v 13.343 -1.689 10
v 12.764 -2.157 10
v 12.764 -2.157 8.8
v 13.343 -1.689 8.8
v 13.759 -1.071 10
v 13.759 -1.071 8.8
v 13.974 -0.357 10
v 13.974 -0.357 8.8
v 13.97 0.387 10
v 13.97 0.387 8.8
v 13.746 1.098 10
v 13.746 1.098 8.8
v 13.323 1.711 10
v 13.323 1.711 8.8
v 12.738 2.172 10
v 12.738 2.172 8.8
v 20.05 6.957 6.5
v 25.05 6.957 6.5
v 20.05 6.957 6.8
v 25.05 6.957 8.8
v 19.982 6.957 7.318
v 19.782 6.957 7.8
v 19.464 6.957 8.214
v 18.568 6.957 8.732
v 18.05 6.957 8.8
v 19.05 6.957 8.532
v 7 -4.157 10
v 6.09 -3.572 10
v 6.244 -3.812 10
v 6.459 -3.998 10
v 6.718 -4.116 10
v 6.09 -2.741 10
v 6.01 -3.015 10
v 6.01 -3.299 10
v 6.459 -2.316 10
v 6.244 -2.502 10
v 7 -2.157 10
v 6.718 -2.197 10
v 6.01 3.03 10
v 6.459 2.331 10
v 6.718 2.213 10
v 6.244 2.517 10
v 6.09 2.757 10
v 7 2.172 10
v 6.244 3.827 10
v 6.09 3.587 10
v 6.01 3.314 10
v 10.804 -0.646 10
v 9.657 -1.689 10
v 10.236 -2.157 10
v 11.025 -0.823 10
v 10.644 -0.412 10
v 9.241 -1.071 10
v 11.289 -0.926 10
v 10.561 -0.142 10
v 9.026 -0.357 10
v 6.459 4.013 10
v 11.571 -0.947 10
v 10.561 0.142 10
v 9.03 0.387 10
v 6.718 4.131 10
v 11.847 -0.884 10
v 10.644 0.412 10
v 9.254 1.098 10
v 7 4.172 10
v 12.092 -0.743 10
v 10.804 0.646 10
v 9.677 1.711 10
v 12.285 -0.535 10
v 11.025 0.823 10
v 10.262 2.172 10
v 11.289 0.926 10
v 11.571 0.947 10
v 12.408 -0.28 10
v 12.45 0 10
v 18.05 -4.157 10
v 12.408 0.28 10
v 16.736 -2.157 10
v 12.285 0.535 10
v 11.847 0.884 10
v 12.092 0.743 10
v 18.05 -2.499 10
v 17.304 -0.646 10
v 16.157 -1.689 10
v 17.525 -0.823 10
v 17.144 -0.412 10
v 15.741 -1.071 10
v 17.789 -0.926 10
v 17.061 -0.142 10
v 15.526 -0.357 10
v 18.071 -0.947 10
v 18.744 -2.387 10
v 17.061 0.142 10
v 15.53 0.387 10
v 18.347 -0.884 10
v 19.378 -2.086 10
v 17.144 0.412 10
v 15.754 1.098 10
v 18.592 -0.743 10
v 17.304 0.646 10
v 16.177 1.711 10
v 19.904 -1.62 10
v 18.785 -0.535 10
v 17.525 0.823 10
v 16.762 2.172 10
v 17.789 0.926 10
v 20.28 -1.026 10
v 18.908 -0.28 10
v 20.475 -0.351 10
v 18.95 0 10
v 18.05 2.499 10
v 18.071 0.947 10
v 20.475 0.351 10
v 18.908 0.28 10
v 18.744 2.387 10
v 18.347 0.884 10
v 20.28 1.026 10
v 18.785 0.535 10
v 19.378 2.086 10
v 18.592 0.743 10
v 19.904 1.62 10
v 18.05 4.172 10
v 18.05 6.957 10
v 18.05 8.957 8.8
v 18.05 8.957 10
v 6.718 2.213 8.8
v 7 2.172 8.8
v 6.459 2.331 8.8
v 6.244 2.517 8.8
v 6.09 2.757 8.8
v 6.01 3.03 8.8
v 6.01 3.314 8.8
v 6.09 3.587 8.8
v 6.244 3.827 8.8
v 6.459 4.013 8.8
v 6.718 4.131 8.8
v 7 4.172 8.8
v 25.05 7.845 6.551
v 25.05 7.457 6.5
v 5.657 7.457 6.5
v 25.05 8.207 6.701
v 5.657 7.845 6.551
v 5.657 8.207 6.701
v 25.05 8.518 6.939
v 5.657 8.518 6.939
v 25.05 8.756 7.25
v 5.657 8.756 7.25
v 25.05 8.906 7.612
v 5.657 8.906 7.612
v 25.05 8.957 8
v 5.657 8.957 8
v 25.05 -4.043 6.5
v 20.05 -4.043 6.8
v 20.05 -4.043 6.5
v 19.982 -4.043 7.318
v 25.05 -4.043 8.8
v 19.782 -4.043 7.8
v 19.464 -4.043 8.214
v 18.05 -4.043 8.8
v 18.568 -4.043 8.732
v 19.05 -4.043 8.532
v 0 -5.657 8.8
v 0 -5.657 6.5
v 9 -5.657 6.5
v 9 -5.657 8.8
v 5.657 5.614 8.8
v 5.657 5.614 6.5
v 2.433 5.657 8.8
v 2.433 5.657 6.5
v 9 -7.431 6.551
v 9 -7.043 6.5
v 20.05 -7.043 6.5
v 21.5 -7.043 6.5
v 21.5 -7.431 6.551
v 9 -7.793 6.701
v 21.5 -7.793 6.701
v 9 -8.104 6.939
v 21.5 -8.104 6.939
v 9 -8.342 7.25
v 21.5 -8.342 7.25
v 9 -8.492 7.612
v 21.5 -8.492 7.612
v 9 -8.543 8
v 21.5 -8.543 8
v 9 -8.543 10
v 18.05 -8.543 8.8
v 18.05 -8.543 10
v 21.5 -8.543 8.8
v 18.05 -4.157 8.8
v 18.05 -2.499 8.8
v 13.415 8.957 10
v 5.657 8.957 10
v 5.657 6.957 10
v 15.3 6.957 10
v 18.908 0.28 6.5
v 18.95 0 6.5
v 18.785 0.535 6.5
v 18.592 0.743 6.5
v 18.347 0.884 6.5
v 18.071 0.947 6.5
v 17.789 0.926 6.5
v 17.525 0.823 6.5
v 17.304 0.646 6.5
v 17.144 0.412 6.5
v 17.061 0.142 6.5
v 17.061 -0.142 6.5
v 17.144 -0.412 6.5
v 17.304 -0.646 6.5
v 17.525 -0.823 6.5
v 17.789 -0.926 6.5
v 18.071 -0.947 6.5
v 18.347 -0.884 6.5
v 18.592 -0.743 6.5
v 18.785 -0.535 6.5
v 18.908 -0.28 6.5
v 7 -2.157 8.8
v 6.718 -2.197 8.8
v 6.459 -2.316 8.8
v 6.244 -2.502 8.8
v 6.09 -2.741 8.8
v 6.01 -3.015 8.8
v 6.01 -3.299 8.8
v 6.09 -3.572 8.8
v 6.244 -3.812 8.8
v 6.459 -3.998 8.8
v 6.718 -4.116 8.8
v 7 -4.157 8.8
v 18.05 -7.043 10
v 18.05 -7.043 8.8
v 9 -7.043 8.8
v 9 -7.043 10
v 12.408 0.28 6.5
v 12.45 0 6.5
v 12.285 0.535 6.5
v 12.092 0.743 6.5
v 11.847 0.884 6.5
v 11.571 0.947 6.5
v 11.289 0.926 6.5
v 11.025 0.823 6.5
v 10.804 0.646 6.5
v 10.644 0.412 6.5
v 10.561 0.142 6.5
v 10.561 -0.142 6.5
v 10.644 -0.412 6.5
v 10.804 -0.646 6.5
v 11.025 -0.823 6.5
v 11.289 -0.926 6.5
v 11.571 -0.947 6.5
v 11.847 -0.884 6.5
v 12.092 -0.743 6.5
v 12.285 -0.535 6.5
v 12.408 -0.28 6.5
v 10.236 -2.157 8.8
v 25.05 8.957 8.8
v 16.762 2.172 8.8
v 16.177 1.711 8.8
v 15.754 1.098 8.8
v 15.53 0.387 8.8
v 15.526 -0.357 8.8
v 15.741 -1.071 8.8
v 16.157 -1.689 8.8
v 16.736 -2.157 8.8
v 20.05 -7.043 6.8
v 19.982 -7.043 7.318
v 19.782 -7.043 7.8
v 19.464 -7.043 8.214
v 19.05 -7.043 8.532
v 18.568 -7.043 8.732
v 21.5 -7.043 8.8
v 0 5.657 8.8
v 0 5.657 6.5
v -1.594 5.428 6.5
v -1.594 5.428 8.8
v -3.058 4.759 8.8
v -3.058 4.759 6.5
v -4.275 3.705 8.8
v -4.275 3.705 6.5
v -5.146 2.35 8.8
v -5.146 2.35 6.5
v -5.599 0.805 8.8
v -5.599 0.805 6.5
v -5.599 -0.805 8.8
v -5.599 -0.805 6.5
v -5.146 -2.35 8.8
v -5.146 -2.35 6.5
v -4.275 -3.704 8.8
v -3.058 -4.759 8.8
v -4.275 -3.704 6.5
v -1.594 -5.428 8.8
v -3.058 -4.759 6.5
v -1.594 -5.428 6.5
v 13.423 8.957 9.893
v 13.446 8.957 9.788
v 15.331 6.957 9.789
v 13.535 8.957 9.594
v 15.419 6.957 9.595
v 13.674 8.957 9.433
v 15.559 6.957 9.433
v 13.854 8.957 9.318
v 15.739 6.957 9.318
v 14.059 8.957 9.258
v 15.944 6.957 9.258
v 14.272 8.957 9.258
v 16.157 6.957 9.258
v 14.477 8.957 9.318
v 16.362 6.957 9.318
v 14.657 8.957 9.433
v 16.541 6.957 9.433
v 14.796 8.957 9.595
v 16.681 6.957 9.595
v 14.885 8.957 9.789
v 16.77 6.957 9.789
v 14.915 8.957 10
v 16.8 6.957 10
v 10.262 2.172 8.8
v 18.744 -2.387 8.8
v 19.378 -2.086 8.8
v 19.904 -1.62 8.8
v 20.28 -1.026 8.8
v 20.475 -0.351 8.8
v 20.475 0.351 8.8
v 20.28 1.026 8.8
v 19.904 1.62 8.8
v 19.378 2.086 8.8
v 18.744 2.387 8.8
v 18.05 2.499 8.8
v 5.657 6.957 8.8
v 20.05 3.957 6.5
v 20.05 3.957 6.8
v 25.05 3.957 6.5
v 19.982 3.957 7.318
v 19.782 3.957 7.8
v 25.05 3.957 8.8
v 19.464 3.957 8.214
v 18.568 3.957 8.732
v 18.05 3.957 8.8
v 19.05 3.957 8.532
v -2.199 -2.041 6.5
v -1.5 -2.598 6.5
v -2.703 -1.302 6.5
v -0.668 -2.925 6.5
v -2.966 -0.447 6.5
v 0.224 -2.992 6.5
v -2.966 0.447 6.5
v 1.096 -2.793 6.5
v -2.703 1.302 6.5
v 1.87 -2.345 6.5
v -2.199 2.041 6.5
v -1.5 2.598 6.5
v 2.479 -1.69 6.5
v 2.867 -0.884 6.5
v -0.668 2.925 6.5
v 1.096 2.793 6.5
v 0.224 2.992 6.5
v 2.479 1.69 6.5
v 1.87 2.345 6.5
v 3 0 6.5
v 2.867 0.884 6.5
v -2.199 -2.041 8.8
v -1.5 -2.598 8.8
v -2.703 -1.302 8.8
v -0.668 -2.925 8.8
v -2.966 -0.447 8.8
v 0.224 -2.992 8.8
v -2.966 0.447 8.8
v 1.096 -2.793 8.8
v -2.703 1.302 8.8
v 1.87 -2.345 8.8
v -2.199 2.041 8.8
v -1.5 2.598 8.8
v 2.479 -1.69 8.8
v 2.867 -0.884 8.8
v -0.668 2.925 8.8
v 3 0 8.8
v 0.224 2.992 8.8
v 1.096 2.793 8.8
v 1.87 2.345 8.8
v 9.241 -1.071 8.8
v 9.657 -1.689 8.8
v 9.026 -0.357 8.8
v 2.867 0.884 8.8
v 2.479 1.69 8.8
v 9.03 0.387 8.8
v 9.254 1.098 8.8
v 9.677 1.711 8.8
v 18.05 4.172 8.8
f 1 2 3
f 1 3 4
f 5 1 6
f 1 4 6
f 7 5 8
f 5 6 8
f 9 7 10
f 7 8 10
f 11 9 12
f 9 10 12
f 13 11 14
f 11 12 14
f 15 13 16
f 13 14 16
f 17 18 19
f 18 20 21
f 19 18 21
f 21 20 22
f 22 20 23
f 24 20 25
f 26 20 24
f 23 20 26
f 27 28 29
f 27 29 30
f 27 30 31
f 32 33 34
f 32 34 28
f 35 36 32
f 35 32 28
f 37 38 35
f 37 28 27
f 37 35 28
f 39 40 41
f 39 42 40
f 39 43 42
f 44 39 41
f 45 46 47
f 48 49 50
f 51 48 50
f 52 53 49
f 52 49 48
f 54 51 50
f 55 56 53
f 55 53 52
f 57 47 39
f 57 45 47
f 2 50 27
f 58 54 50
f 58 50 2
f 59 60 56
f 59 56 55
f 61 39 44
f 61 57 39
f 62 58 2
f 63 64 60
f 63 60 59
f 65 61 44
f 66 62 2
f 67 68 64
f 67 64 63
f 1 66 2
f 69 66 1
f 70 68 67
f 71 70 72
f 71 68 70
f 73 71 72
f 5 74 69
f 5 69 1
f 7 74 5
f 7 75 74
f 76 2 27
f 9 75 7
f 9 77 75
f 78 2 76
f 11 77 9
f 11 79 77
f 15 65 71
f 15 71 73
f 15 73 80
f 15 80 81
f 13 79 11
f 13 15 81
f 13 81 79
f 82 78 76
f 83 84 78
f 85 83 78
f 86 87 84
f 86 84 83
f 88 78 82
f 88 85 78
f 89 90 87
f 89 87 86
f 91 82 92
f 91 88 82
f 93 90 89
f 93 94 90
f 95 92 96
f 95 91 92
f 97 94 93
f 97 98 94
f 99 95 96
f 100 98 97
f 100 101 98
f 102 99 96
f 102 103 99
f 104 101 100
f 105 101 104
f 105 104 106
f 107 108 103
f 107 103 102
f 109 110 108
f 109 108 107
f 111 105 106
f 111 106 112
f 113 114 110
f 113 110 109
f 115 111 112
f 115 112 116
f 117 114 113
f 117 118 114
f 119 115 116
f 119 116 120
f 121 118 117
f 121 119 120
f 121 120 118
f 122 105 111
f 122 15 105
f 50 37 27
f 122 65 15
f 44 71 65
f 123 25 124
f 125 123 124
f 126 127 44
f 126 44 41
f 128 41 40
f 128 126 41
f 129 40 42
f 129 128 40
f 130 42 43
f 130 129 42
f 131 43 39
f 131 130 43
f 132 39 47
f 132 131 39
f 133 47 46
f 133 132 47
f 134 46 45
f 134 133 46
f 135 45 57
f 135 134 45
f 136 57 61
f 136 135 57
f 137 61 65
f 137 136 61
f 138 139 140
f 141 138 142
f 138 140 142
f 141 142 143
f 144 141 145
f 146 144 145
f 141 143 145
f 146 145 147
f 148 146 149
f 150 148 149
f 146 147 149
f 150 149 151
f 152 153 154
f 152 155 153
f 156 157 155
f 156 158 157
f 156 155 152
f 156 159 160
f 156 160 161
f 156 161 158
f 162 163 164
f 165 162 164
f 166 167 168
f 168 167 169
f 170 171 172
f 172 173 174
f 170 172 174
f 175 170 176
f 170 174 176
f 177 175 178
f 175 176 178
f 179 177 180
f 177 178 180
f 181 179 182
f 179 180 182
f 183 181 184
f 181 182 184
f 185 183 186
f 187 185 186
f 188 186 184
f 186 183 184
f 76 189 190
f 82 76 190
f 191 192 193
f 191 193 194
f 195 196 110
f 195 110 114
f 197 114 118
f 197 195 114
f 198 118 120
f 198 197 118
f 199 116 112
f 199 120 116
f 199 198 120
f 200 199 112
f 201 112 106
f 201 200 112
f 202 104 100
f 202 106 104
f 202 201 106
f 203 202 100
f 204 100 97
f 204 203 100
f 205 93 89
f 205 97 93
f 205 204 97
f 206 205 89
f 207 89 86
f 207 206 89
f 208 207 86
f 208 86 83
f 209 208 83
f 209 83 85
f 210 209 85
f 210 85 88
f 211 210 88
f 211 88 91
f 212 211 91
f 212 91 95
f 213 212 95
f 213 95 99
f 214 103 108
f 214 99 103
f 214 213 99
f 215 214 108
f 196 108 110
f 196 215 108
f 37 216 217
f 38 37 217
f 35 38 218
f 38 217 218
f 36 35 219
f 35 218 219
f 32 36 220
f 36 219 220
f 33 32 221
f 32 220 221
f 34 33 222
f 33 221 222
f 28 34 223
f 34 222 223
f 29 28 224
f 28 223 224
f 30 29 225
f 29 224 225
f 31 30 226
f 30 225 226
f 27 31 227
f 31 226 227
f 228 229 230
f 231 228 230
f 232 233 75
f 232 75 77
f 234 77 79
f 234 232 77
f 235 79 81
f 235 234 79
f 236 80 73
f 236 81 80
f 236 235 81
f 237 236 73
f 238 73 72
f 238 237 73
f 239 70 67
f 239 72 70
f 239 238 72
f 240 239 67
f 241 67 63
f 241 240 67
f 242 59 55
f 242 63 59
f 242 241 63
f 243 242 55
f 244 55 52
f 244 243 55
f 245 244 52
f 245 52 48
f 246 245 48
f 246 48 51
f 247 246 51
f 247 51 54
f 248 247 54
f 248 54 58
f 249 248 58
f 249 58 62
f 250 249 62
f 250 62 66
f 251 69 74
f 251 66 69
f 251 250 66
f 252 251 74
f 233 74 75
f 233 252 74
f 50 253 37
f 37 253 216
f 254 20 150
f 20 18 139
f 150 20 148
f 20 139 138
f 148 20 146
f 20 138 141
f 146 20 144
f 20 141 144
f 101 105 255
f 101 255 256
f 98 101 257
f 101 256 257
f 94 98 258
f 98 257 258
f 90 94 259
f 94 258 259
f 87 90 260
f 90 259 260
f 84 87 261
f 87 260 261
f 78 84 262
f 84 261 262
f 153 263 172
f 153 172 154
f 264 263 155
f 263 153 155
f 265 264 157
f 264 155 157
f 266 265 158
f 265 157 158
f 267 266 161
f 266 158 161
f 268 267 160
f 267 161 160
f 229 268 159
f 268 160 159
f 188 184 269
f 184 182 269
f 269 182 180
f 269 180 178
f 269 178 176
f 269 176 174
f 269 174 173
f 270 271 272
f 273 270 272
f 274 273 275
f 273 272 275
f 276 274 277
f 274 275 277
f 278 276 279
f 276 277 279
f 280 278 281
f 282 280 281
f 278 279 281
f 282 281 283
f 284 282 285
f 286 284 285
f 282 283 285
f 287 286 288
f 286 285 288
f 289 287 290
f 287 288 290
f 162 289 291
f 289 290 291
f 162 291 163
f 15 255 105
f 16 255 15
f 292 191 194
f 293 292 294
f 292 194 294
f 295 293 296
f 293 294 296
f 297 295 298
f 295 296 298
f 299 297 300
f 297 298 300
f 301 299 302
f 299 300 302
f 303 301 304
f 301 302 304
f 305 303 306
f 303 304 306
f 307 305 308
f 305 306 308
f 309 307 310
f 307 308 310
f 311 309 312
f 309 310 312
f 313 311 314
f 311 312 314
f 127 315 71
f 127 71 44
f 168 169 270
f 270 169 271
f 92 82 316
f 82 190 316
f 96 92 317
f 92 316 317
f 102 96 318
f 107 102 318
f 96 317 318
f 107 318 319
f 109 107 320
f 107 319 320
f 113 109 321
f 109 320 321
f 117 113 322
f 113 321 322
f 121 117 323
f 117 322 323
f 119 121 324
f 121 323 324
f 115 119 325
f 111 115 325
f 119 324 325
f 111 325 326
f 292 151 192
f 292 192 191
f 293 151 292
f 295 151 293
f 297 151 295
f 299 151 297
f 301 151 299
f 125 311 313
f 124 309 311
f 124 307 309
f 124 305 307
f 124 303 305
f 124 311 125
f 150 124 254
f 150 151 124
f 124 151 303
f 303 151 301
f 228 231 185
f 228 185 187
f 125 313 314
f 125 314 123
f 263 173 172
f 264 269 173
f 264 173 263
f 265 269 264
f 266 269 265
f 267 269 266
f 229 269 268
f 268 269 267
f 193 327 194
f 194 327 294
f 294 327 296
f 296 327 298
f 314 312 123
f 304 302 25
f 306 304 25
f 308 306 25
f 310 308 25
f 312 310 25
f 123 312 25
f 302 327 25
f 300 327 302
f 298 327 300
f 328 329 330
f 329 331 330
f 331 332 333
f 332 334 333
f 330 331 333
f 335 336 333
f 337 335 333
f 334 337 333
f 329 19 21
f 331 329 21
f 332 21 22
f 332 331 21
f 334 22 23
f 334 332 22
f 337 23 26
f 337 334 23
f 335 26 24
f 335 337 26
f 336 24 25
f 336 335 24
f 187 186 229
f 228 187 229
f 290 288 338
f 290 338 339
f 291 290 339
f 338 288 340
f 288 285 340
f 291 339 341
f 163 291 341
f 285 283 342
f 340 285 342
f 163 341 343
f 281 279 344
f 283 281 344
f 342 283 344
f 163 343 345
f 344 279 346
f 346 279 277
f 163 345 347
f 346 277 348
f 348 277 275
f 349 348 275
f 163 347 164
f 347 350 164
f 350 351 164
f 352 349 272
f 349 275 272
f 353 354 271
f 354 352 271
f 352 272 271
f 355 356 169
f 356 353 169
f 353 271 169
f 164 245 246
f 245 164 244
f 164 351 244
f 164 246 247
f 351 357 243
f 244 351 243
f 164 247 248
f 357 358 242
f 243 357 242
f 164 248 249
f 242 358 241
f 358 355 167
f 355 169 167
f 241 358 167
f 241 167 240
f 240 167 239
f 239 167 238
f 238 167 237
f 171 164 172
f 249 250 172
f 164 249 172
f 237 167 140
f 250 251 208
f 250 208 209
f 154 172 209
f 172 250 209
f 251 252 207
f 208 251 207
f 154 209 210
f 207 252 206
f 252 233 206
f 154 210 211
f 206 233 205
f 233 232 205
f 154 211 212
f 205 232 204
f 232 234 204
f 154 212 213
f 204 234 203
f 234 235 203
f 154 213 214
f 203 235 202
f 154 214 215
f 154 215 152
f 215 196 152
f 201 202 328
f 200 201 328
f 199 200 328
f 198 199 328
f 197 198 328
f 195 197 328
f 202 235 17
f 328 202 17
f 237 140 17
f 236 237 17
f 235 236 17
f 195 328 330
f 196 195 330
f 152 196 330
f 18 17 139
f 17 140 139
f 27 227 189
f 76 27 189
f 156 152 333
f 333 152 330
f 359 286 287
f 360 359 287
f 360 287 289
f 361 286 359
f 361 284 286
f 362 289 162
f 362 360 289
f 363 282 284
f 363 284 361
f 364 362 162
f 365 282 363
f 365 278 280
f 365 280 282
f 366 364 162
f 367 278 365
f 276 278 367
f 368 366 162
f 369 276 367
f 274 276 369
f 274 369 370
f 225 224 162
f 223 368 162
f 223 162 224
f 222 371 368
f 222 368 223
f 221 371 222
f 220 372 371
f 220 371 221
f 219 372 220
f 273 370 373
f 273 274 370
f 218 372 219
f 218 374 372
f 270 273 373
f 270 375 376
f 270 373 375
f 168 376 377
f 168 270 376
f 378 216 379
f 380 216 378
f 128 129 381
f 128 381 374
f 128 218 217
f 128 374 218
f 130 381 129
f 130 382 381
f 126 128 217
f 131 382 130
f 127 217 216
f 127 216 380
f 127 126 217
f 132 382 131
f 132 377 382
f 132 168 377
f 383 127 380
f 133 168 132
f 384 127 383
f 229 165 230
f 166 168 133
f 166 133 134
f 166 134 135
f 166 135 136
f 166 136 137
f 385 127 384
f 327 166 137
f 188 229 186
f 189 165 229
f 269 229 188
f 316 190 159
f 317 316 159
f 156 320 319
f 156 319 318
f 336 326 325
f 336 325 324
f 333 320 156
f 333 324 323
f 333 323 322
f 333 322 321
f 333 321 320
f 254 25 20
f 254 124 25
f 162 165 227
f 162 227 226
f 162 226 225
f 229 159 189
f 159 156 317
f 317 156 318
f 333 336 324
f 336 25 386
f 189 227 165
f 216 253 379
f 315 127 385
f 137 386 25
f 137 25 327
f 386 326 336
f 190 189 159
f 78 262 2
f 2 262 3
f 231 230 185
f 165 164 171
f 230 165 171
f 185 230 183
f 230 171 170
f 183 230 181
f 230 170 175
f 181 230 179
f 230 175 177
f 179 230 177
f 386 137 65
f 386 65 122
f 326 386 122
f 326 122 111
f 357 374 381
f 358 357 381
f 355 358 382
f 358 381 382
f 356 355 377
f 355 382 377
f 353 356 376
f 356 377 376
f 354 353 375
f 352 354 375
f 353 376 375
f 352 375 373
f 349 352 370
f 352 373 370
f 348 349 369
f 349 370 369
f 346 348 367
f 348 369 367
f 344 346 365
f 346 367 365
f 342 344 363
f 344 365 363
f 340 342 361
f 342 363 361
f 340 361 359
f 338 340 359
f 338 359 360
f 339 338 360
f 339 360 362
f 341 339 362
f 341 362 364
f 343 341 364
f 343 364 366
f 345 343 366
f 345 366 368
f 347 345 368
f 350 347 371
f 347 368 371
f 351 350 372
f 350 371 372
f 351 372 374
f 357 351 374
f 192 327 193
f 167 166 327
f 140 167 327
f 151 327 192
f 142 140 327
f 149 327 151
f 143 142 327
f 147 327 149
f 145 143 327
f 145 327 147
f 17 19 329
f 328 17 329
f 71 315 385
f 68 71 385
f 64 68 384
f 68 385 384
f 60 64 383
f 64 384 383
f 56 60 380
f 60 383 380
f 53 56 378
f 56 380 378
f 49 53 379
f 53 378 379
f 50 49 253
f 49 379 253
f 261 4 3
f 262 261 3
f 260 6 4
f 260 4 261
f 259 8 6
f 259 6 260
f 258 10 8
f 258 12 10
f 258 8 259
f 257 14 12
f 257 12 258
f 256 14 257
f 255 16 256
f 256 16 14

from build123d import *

# Parameters (mm, degrees)
BOSS_EXTRUDE1_DEPTH      = 2
BOSS_EXTRUDE6_DEPTH      = 4.5
CUT_EXTRUDE6_DEPTH       = 4.5
BOSS_EXTRUDE14_DEPTH     = 2.3
SKETCH32_R               = 3
CUT_EXTRUDE7_DEPTH       = 2.3
SKETCH33_W               = 12.393398282201806
SKETCH33_H               = 2.000000000000001
BOSS_EXTRUDE15_DEPTH     = 1.2
CUT_EXTRUDE8_DEPTH       = 2.4
SKETCH43_R               = 2.5000000000000004
SKETCH43_R_2             = 2.4999999999999982
BOSS_EXTRUDE17_DEPTH     = 1.2
CUT_EXTRUDE11_DEPTH      = 29.420773915365164
CUT_EXTRUDE11_DEPTH_BACK = 29.420773915365164
SKETCH44_R               = 0.9499999999999992
SKETCH44_R_2             = 0.9500000000000008
SKETCH49_R               = 0.7500000000000021
CUT_EXTRUDE13_DEPTH      = 3
FILLET1_R                = 1.5
FILLET3_START            = -1
FILLET3_DEPTH            = 8
FILLET3_START_2          = 5
FILLET3_2_DEPTH          = 21
FILLET3_3_DEPTH          = 8
SKETCH45_R               = 1.9999999999999996
SKETCH45_R_2             = 2.000000000000003
CUT_EXTRUDE15_DEPTH      = 4
FILLET4_R                = 2
BOSS_EXTRUDE18_DEPTH     = 12
SKETCH52_R               = 1.500000000000004
SKETCH52_R_2             = 1.5000000000000007
CUT_EXTRUDE16_DEPTH      = 12


with BuildPart() as part:
    # Sketch3 → Boss-Extrude1 (new body)
    with BuildSketch(Plane.XY):
        with BuildLine():
            Line((8.000000000000002, 0), (8.999999999999995, -2.5431457505076205))
            Line((8.999999999999995, -2.5431457505076205), (8.999999999999995, -7.043145750507605))
            Line((8.999999999999995, -7.043145750507605), (21.50000000000004, -7.043145750507604))
            Line((21.50000000000004, -7.043145750507604), (25.05025253169418, -7.043145750507604))
            Line((25.05025253169418, -7.043145750507604), (25.050252531694177, 7.456854249492383))
            Line((25.050252531694177, 7.456854249492383), (5.656854249492373, 7.456854249492379))
            Line((5.656854249492373, 7.456854249492379), (5.656854249492376, 5.656854249492382))
            ThreePointArc((5.656854249492376, 5.656854249492382), (7.391036260090296, 3.061467458920721), (8.000000000000002, 0))
        make_face()
    extrude(amount=BOSS_EXTRUDE1_DEPTH)

    # Sketch22 → Boss-Extrude6 (add)
    with BuildSketch(Plane.XY.offset(2)):
        with BuildLine():
            Line((5.656854249492378, 7.456854249492383), (21.500000000000025, 7.456854249492383))
            Line((21.500000000000025, 7.456854249492383), (25.050252531694177, 7.456854249492383))
            Line((25.050252531694177, 7.456854249492383), (25.05025253169418, -7.043145750507604))
            Line((25.05025253169418, -7.043145750507604), (8.999999999999995, -7.043145750507605))
            Line((8.999999999999995, -7.043145750507605), (8.999999999999995, -2.5431457505076205))
            Line((8.999999999999995, -2.5431457505076205), (7.999999999999998, 0))
            ThreePointArc((7.999999999999998, 0), (7.391036260090291, 3.061467458920719), (5.656854249492376, 5.656854249492382))
            Line((5.656854249492376, 5.656854249492382), (5.656854249492378, 7.456854249492383))
        make_face()
    extrude(amount=BOSS_EXTRUDE6_DEPTH)

    # Sketch26 → Cut-Extrude6 (cut)
    with BuildSketch(Plane.XY.offset(2)):
        Polygon((18.098080447707712, 5.299999999999999), (2.5300524575164793, 5.299999999999999), (2.5300524575164793, 4), (18.098080447707712, 4), (25.05025253169419, 4.000000000000001), (25.05025253169419, 5.299999999999999), align=None)
    extrude(amount=CUT_EXTRUDE6_DEPTH, mode=Mode.SUBTRACT)


with BuildPart() as body_2:
    # Sketch31 → Boss-Extrude14 (new body)
    with BuildSketch(Plane.XY.offset(6.5)):
        with BuildLine():
            Line((2.4326880657739025, 5.656854247099344), (0.00016454221484158, 5.656854247099344))
            ThreePointArc((0.00016454221484158, 5.656854247099344), (-5.656854248894122, 8.227110743131e-05), (0, -5.656854249492382))
            Line((0, -5.656854249492382), (9.000000000000004, -5.656854249492382))
            Line((9.000000000000004, -5.656854249492382), (8.999999999999995, -7.043145750507605))
            Line((8.999999999999995, -7.043145750507605), (8.999999999999995, -8.543145750507605))
            Line((8.999999999999995, -8.543145750507605), (21.50000000000004, -8.543145750507605))
            Line((21.50000000000004, -8.543145750507605), (21.50000000000004, -7.043145750507605))
            Line((21.50000000000004, -7.043145750507605), (25.05025253169418, -7.043145750507604))
            Line((25.05025253169418, -7.043145750507604), (25.05025253169418, 8.956854249492379))
            Line((25.05025253169418, 8.956854249492379), (5.656854249492376, 8.956854249492379))
            Line((5.656854249492376, 8.956854249492379), (5.656854249492378, 7.456854249492383))
            Line((5.656854249492378, 7.456854249492383), (5.656854249492376, 5.613708498984764))
            Line((5.656854249492376, 5.613708498984764), (2.4326880657739025, 5.656854247099344))
        make_face()
    extrude(amount=BOSS_EXTRUDE14_DEPTH)

    # Sketch32 → Cut-Extrude7 (cut)
    with BuildSketch(Plane.XY.offset(8.799999999999999)):
        Circle(SKETCH32_R)
    extrude(amount=-CUT_EXTRUDE7_DEPTH, mode=Mode.SUBTRACT)

    # Sketch33 → Boss-Extrude15 (add)
    with BuildSketch(Plane.XY.offset(8.799999999999999)):
        with Locations((11.853553390593277, 7.956854249492379)):
            Rectangle(SKETCH33_W, SKETCH33_H)
        Polygon((9.000000000000004, -7.043145750507606), (9.000000000000004, -8.543145750507605), (18.05025253169418, -8.543145750507605), (18.05025253169418, -7.0431457505076045), align=None)
        with BuildLine():
            Line((7.000000000000003, -4.156854249492383), (18.05025253169419, -4.156854249492383))
            Line((18.05025253169419, -4.156854249492383), (18.05025253169419, -2.1568542494923824))
            Line((18.05025253169419, -2.1568542494923824), (7.000000000000003, -2.1568542494923832))
            ThreePointArc((7.000000000000003, -2.1568542494923832), (6.000000000000003, -3.1568542494923832), (7.000000000000003, -4.156854249492383))
        make_face()
        with BuildLine():
            Line((18.05025253169419, 2.172006245196199), (7.000000000000003, 2.172006245196201))
            ThreePointArc((7.000000000000003, 2.172006245196201), (6.0000000000000036, 3.1720062451962), (7.000000000000003, 4.172006245196199))
            Line((7.000000000000003, 4.172006245196199), (18.05025253169419, 4.172006245196199))
            Line((18.05025253169419, 4.172006245196199), (18.05025253169419, 2.172006245196199))
        make_face()
    extrude(amount=BOSS_EXTRUDE15_DEPTH)


with BuildPart() as cut_extrude8_tool:
    # Sketch35 → Cut-Extrude8 (new body)
    with BuildSketch(Plane.XY.offset(8.799999999999999)):
        Polygon((25.05025253169418, 3.956854249492379), (25.05025253169418, 6.9568542494923795), (20.05025253169418, 6.956854249492378), (20.05025253169418, 3.9568542494923773), align=None)
        Polygon((25.05025253169418, -7.043145750507604), (20.05025253169419, -7.0431457505076045), (20.05025253169419, -4.043145750507604), (25.05025253169418, -4.043145750507604), align=None)
    extrude(amount=-CUT_EXTRUDE8_DEPTH)


with BuildPart() as part_1:
    add(part.part)

    # Cut-Extrude8: cut by cut_extrude8_tool
    add(cut_extrude8_tool.part, mode=Mode.SUBTRACT)


with BuildPart() as body_2_1:
    add(body_2.part)

    # Cut-Extrude8: cut by cut_extrude8_tool
    add(cut_extrude8_tool.part, mode=Mode.SUBTRACT)

    # Sketch43 → Boss-Extrude17 (add)
    with BuildSketch(Plane.XY.offset(8.799999999999999)):
        with Locations((11.500000000000004, 0)):
            Circle(SKETCH43_R)
        with Locations((18.000000000000004, 0)):
            Circle(SKETCH43_R_2)
    extrude(amount=BOSS_EXTRUDE17_DEPTH)


with BuildPart() as cut_extrude11_tool:
    # Sketch44 → Cut-Extrude11 (new, two sides: drawn at the far end of the back side and taken through both)
    with BuildSketch(Plane.XY.offset(9.999999999999998).offset(-CUT_EXTRUDE11_DEPTH_BACK)):
        with Locations((11.500000000000004, 0)):
            Circle(SKETCH44_R)
        with Locations((18.000000000000004, 0)):
            Circle(SKETCH44_R_2)
    extrude(amount=CUT_EXTRUDE11_DEPTH + CUT_EXTRUDE11_DEPTH_BACK)


with BuildPart() as part_2:
    add(part_1.part)

    # Cut-Extrude11: cut by cut_extrude11_tool
    add(cut_extrude11_tool.part, mode=Mode.SUBTRACT)

    # Fillet3: read off the stored shape, not the designer's step
    # Fillet3 outline → Fillet3 (cut)
    with BuildSketch(Plane.XY.offset(FILLET3_START)):
        with BuildLine():
            Line((9, -7.043145751), (10, -7.043145751))
            add(Edge.make_bspline(
                [(10, -7.043145751), (8.99999999999999, -7.043145750507609), (9, -6.043145751)],
                knots=[0, 0, 0, 1, 1, 1], degree=2, weights=[1, 0.7071067811865481, 1]))
            Line((9, -6.043145751), (9, -7.043145751))
        make_face()
        with BuildLine():
            Line((5.656854249, 7.456854249), (5.656854249, 6.456854249))
            add(Edge.make_bspline(
                [(5.656854249, 6.456854249), (5.656854249492369, 7.4568542494923795), (6.656854249, 7.456854249)],
                knots=[0, 0, 0, 1, 1, 1], degree=2, weights=[1, 0.707106781186547, 1]))
            Line((6.656854249, 7.456854249), (5.656854249, 7.456854249))
        make_face()
    extrude(amount=FILLET3_DEPTH, mode=Mode.SUBTRACT)

    # Fillet3 2 outline → Fillet3 2 (cut)
    with BuildSketch(Plane.YZ.offset(FILLET3_START_2)):
        with BuildLine():
            Line((-7.043145751, 0), (-6.043145751, 0))
            add(Edge.make_bspline(
                [(-6.043145751, 0), (-7.0431457505076045, 0), (-7.043145751, 1)],
                knots=[0, 0, 0, 1, 1, 1], degree=2, weights=[1, 0.707106781186548, 1]))
            Line((-7.043145751, 1), (-7.043145751, 0))
        make_face()
        with BuildLine():
            add(Edge.make_bspline(
                [(6.456854249, 0), (7.456854249492381, 0), (7.456854249, 1)],
                knots=[0, 0, 0, 1, 1, 1], degree=2, weights=[1, 0.707106781186548, 1]))
            Line((6.456854249, 0), (7.456854249, 0))
            Line((7.456854249, 0), (7.456854249, 1))
        make_face()
    extrude(amount=FILLET3_2_DEPTH, mode=Mode.SUBTRACT)

    # Fillet3 3 outline → Fillet3 3 (cut)
    with BuildSketch(Plane.XY.offset(FILLET3_START)):
        with BuildLine():
            Line((25.050252532, -7.043145751), (25.050252532, -6.043145751))
            add(Edge.make_bspline(
                [(25.050252532, -6.043145751), (25.050252531694195, -7.0431457505076045), (24.050252532, -7.043145751)],
                knots=[0, 0, 0, 1, 1, 1], degree=2, weights=[1, 0.707106781186548, 1]))
            Line((24.050252532, -7.043145751), (25.050252532, -7.043145751))
        make_face()
        with BuildLine():
            Line((25.050252532, 6.456854249), (25.050252532, 7.456854249))
            Line((25.050252532, 7.456854249), (24.050252532, 7.456854249))
            add(Edge.make_bspline(
                [(24.050252532, 7.456854249), (24.23662286224227, 7.456854249492371), (24.442904569552457, 7.413222711328381), (24.646119560607424, 7.308816022097408), (24.808964717093836, 7.142726196138974), (24.971827345010716, 6.860639849810825), (25.01301948040526, 6.758429238057051), (25.038618001980854, 6.6546327736033515), (25.050252531694174, 6.553326631418876), (25.050252532, 6.456854249)],
                knots=[0, 0, 0, 0, 0, 0, 0.6589186227127712, 0.6589186227127712, 0.6589186227127712, 0.6589186227127712, 1.0000000000000395, 1.0000000000000395, 1.0000000000000395, 1.0000000000000395, 1.0000000000000395, 1.0000000000000395], degree=5, weights=[1, 1.0000000000000024, 0.9950915544751191, 0.9930584097693568, 0.9999999999999981, 1.0000000000000009, 0.9997935626898684, 0.9999244387002607, 0.9999999999999992, 1]))
        make_face()
    extrude(amount=FILLET3_3_DEPTH, mode=Mode.SUBTRACT)

    # Sketch45 → Cut-Extrude15 (cut)
    with BuildSketch(Plane(origin=(0, 0, 0), x_dir=(-1, 0, 0), z_dir=(0, 0, -1))):
        with Locations((-11.500000000000004, 0)):
            Circle(SKETCH45_R)
        with Locations((-18.000000000000004, 0)):
            Circle(SKETCH45_R_2)
    extrude(amount=-CUT_EXTRUDE15_DEPTH, mode=Mode.SUBTRACT)

    # Sketch51 → Boss-Extrude18 (add)
    with BuildSketch(Plane(origin=(25.05025253169418, 5.99e-15, 0), x_dir=(0, 0, -1), z_dir=(1, 2.4e-16, 0))):
        Polygon((-9.5e-16, 3.9999999999999947), (3e-17, -4.000000000000005), (-3, -4.000000000000005), (-3.000000000000001, 3.9999999999999942), align=None)
    extrude(amount=BOSS_EXTRUDE18_DEPTH)

    # Sketch52 → Cut-Extrude16 (cut)
    with BuildSketch(Plane(origin=(0, 0, 0), x_dir=(-1, 0, 0), z_dir=(0, 0, -1))):
        with Locations((-34.05025253169418, 3.47e-15)):
            Circle(SKETCH52_R)
        with Locations((-28.05025253169418, 3.9e-15)):
            Circle(SKETCH52_R_2)
    extrude(amount=-CUT_EXTRUDE16_DEPTH, mode=Mode.SUBTRACT)


with BuildPart() as body_2_2:
    add(body_2_1.part)

    # Cut-Extrude11: cut by cut_extrude11_tool
    add(cut_extrude11_tool.part, mode=Mode.SUBTRACT)

    # Sketch49 → Cut-Extrude13 (cut, along a direction that is not the sketch's normal)
    with BuildSketch(Plane.XZ.offset(-6.956854249492379)):
        with Locations((16.05025253169419, 9.999999999999998)):
            Circle(SKETCH49_R)
    extrude(amount=-CUT_EXTRUDE13_DEPTH, dir=(0.6858421465414155, -0.7277503349552398, 0), mode=Mode.SUBTRACT)

    # Fillet1
    fillet1_edges = [body_2_2.edges().sort_by_distance(p)[0] for p in [
        (15.353553390593278, 8.956854249492379, 6.5),
        (15.250000000000018, -8.543145750507605, 6.5),
    ]]
    fillet(fillet1_edges, radius=FILLET1_R)

    # Fillet4
    fillet4_edges = [body_2_2.edges().sort_by_distance(p)[0] for p in [
        (20.05025253169418, 5.456854249492378, 8.799999999999999),
        (20.05025253169419, -5.543145750507604, 8.799999999999999),
    ]]
    fillet(fillet4_edges, radius=FILLET4_R - 0.0001)  # a hair under: the kernel refuses the full size


solid = body_2_2.part
